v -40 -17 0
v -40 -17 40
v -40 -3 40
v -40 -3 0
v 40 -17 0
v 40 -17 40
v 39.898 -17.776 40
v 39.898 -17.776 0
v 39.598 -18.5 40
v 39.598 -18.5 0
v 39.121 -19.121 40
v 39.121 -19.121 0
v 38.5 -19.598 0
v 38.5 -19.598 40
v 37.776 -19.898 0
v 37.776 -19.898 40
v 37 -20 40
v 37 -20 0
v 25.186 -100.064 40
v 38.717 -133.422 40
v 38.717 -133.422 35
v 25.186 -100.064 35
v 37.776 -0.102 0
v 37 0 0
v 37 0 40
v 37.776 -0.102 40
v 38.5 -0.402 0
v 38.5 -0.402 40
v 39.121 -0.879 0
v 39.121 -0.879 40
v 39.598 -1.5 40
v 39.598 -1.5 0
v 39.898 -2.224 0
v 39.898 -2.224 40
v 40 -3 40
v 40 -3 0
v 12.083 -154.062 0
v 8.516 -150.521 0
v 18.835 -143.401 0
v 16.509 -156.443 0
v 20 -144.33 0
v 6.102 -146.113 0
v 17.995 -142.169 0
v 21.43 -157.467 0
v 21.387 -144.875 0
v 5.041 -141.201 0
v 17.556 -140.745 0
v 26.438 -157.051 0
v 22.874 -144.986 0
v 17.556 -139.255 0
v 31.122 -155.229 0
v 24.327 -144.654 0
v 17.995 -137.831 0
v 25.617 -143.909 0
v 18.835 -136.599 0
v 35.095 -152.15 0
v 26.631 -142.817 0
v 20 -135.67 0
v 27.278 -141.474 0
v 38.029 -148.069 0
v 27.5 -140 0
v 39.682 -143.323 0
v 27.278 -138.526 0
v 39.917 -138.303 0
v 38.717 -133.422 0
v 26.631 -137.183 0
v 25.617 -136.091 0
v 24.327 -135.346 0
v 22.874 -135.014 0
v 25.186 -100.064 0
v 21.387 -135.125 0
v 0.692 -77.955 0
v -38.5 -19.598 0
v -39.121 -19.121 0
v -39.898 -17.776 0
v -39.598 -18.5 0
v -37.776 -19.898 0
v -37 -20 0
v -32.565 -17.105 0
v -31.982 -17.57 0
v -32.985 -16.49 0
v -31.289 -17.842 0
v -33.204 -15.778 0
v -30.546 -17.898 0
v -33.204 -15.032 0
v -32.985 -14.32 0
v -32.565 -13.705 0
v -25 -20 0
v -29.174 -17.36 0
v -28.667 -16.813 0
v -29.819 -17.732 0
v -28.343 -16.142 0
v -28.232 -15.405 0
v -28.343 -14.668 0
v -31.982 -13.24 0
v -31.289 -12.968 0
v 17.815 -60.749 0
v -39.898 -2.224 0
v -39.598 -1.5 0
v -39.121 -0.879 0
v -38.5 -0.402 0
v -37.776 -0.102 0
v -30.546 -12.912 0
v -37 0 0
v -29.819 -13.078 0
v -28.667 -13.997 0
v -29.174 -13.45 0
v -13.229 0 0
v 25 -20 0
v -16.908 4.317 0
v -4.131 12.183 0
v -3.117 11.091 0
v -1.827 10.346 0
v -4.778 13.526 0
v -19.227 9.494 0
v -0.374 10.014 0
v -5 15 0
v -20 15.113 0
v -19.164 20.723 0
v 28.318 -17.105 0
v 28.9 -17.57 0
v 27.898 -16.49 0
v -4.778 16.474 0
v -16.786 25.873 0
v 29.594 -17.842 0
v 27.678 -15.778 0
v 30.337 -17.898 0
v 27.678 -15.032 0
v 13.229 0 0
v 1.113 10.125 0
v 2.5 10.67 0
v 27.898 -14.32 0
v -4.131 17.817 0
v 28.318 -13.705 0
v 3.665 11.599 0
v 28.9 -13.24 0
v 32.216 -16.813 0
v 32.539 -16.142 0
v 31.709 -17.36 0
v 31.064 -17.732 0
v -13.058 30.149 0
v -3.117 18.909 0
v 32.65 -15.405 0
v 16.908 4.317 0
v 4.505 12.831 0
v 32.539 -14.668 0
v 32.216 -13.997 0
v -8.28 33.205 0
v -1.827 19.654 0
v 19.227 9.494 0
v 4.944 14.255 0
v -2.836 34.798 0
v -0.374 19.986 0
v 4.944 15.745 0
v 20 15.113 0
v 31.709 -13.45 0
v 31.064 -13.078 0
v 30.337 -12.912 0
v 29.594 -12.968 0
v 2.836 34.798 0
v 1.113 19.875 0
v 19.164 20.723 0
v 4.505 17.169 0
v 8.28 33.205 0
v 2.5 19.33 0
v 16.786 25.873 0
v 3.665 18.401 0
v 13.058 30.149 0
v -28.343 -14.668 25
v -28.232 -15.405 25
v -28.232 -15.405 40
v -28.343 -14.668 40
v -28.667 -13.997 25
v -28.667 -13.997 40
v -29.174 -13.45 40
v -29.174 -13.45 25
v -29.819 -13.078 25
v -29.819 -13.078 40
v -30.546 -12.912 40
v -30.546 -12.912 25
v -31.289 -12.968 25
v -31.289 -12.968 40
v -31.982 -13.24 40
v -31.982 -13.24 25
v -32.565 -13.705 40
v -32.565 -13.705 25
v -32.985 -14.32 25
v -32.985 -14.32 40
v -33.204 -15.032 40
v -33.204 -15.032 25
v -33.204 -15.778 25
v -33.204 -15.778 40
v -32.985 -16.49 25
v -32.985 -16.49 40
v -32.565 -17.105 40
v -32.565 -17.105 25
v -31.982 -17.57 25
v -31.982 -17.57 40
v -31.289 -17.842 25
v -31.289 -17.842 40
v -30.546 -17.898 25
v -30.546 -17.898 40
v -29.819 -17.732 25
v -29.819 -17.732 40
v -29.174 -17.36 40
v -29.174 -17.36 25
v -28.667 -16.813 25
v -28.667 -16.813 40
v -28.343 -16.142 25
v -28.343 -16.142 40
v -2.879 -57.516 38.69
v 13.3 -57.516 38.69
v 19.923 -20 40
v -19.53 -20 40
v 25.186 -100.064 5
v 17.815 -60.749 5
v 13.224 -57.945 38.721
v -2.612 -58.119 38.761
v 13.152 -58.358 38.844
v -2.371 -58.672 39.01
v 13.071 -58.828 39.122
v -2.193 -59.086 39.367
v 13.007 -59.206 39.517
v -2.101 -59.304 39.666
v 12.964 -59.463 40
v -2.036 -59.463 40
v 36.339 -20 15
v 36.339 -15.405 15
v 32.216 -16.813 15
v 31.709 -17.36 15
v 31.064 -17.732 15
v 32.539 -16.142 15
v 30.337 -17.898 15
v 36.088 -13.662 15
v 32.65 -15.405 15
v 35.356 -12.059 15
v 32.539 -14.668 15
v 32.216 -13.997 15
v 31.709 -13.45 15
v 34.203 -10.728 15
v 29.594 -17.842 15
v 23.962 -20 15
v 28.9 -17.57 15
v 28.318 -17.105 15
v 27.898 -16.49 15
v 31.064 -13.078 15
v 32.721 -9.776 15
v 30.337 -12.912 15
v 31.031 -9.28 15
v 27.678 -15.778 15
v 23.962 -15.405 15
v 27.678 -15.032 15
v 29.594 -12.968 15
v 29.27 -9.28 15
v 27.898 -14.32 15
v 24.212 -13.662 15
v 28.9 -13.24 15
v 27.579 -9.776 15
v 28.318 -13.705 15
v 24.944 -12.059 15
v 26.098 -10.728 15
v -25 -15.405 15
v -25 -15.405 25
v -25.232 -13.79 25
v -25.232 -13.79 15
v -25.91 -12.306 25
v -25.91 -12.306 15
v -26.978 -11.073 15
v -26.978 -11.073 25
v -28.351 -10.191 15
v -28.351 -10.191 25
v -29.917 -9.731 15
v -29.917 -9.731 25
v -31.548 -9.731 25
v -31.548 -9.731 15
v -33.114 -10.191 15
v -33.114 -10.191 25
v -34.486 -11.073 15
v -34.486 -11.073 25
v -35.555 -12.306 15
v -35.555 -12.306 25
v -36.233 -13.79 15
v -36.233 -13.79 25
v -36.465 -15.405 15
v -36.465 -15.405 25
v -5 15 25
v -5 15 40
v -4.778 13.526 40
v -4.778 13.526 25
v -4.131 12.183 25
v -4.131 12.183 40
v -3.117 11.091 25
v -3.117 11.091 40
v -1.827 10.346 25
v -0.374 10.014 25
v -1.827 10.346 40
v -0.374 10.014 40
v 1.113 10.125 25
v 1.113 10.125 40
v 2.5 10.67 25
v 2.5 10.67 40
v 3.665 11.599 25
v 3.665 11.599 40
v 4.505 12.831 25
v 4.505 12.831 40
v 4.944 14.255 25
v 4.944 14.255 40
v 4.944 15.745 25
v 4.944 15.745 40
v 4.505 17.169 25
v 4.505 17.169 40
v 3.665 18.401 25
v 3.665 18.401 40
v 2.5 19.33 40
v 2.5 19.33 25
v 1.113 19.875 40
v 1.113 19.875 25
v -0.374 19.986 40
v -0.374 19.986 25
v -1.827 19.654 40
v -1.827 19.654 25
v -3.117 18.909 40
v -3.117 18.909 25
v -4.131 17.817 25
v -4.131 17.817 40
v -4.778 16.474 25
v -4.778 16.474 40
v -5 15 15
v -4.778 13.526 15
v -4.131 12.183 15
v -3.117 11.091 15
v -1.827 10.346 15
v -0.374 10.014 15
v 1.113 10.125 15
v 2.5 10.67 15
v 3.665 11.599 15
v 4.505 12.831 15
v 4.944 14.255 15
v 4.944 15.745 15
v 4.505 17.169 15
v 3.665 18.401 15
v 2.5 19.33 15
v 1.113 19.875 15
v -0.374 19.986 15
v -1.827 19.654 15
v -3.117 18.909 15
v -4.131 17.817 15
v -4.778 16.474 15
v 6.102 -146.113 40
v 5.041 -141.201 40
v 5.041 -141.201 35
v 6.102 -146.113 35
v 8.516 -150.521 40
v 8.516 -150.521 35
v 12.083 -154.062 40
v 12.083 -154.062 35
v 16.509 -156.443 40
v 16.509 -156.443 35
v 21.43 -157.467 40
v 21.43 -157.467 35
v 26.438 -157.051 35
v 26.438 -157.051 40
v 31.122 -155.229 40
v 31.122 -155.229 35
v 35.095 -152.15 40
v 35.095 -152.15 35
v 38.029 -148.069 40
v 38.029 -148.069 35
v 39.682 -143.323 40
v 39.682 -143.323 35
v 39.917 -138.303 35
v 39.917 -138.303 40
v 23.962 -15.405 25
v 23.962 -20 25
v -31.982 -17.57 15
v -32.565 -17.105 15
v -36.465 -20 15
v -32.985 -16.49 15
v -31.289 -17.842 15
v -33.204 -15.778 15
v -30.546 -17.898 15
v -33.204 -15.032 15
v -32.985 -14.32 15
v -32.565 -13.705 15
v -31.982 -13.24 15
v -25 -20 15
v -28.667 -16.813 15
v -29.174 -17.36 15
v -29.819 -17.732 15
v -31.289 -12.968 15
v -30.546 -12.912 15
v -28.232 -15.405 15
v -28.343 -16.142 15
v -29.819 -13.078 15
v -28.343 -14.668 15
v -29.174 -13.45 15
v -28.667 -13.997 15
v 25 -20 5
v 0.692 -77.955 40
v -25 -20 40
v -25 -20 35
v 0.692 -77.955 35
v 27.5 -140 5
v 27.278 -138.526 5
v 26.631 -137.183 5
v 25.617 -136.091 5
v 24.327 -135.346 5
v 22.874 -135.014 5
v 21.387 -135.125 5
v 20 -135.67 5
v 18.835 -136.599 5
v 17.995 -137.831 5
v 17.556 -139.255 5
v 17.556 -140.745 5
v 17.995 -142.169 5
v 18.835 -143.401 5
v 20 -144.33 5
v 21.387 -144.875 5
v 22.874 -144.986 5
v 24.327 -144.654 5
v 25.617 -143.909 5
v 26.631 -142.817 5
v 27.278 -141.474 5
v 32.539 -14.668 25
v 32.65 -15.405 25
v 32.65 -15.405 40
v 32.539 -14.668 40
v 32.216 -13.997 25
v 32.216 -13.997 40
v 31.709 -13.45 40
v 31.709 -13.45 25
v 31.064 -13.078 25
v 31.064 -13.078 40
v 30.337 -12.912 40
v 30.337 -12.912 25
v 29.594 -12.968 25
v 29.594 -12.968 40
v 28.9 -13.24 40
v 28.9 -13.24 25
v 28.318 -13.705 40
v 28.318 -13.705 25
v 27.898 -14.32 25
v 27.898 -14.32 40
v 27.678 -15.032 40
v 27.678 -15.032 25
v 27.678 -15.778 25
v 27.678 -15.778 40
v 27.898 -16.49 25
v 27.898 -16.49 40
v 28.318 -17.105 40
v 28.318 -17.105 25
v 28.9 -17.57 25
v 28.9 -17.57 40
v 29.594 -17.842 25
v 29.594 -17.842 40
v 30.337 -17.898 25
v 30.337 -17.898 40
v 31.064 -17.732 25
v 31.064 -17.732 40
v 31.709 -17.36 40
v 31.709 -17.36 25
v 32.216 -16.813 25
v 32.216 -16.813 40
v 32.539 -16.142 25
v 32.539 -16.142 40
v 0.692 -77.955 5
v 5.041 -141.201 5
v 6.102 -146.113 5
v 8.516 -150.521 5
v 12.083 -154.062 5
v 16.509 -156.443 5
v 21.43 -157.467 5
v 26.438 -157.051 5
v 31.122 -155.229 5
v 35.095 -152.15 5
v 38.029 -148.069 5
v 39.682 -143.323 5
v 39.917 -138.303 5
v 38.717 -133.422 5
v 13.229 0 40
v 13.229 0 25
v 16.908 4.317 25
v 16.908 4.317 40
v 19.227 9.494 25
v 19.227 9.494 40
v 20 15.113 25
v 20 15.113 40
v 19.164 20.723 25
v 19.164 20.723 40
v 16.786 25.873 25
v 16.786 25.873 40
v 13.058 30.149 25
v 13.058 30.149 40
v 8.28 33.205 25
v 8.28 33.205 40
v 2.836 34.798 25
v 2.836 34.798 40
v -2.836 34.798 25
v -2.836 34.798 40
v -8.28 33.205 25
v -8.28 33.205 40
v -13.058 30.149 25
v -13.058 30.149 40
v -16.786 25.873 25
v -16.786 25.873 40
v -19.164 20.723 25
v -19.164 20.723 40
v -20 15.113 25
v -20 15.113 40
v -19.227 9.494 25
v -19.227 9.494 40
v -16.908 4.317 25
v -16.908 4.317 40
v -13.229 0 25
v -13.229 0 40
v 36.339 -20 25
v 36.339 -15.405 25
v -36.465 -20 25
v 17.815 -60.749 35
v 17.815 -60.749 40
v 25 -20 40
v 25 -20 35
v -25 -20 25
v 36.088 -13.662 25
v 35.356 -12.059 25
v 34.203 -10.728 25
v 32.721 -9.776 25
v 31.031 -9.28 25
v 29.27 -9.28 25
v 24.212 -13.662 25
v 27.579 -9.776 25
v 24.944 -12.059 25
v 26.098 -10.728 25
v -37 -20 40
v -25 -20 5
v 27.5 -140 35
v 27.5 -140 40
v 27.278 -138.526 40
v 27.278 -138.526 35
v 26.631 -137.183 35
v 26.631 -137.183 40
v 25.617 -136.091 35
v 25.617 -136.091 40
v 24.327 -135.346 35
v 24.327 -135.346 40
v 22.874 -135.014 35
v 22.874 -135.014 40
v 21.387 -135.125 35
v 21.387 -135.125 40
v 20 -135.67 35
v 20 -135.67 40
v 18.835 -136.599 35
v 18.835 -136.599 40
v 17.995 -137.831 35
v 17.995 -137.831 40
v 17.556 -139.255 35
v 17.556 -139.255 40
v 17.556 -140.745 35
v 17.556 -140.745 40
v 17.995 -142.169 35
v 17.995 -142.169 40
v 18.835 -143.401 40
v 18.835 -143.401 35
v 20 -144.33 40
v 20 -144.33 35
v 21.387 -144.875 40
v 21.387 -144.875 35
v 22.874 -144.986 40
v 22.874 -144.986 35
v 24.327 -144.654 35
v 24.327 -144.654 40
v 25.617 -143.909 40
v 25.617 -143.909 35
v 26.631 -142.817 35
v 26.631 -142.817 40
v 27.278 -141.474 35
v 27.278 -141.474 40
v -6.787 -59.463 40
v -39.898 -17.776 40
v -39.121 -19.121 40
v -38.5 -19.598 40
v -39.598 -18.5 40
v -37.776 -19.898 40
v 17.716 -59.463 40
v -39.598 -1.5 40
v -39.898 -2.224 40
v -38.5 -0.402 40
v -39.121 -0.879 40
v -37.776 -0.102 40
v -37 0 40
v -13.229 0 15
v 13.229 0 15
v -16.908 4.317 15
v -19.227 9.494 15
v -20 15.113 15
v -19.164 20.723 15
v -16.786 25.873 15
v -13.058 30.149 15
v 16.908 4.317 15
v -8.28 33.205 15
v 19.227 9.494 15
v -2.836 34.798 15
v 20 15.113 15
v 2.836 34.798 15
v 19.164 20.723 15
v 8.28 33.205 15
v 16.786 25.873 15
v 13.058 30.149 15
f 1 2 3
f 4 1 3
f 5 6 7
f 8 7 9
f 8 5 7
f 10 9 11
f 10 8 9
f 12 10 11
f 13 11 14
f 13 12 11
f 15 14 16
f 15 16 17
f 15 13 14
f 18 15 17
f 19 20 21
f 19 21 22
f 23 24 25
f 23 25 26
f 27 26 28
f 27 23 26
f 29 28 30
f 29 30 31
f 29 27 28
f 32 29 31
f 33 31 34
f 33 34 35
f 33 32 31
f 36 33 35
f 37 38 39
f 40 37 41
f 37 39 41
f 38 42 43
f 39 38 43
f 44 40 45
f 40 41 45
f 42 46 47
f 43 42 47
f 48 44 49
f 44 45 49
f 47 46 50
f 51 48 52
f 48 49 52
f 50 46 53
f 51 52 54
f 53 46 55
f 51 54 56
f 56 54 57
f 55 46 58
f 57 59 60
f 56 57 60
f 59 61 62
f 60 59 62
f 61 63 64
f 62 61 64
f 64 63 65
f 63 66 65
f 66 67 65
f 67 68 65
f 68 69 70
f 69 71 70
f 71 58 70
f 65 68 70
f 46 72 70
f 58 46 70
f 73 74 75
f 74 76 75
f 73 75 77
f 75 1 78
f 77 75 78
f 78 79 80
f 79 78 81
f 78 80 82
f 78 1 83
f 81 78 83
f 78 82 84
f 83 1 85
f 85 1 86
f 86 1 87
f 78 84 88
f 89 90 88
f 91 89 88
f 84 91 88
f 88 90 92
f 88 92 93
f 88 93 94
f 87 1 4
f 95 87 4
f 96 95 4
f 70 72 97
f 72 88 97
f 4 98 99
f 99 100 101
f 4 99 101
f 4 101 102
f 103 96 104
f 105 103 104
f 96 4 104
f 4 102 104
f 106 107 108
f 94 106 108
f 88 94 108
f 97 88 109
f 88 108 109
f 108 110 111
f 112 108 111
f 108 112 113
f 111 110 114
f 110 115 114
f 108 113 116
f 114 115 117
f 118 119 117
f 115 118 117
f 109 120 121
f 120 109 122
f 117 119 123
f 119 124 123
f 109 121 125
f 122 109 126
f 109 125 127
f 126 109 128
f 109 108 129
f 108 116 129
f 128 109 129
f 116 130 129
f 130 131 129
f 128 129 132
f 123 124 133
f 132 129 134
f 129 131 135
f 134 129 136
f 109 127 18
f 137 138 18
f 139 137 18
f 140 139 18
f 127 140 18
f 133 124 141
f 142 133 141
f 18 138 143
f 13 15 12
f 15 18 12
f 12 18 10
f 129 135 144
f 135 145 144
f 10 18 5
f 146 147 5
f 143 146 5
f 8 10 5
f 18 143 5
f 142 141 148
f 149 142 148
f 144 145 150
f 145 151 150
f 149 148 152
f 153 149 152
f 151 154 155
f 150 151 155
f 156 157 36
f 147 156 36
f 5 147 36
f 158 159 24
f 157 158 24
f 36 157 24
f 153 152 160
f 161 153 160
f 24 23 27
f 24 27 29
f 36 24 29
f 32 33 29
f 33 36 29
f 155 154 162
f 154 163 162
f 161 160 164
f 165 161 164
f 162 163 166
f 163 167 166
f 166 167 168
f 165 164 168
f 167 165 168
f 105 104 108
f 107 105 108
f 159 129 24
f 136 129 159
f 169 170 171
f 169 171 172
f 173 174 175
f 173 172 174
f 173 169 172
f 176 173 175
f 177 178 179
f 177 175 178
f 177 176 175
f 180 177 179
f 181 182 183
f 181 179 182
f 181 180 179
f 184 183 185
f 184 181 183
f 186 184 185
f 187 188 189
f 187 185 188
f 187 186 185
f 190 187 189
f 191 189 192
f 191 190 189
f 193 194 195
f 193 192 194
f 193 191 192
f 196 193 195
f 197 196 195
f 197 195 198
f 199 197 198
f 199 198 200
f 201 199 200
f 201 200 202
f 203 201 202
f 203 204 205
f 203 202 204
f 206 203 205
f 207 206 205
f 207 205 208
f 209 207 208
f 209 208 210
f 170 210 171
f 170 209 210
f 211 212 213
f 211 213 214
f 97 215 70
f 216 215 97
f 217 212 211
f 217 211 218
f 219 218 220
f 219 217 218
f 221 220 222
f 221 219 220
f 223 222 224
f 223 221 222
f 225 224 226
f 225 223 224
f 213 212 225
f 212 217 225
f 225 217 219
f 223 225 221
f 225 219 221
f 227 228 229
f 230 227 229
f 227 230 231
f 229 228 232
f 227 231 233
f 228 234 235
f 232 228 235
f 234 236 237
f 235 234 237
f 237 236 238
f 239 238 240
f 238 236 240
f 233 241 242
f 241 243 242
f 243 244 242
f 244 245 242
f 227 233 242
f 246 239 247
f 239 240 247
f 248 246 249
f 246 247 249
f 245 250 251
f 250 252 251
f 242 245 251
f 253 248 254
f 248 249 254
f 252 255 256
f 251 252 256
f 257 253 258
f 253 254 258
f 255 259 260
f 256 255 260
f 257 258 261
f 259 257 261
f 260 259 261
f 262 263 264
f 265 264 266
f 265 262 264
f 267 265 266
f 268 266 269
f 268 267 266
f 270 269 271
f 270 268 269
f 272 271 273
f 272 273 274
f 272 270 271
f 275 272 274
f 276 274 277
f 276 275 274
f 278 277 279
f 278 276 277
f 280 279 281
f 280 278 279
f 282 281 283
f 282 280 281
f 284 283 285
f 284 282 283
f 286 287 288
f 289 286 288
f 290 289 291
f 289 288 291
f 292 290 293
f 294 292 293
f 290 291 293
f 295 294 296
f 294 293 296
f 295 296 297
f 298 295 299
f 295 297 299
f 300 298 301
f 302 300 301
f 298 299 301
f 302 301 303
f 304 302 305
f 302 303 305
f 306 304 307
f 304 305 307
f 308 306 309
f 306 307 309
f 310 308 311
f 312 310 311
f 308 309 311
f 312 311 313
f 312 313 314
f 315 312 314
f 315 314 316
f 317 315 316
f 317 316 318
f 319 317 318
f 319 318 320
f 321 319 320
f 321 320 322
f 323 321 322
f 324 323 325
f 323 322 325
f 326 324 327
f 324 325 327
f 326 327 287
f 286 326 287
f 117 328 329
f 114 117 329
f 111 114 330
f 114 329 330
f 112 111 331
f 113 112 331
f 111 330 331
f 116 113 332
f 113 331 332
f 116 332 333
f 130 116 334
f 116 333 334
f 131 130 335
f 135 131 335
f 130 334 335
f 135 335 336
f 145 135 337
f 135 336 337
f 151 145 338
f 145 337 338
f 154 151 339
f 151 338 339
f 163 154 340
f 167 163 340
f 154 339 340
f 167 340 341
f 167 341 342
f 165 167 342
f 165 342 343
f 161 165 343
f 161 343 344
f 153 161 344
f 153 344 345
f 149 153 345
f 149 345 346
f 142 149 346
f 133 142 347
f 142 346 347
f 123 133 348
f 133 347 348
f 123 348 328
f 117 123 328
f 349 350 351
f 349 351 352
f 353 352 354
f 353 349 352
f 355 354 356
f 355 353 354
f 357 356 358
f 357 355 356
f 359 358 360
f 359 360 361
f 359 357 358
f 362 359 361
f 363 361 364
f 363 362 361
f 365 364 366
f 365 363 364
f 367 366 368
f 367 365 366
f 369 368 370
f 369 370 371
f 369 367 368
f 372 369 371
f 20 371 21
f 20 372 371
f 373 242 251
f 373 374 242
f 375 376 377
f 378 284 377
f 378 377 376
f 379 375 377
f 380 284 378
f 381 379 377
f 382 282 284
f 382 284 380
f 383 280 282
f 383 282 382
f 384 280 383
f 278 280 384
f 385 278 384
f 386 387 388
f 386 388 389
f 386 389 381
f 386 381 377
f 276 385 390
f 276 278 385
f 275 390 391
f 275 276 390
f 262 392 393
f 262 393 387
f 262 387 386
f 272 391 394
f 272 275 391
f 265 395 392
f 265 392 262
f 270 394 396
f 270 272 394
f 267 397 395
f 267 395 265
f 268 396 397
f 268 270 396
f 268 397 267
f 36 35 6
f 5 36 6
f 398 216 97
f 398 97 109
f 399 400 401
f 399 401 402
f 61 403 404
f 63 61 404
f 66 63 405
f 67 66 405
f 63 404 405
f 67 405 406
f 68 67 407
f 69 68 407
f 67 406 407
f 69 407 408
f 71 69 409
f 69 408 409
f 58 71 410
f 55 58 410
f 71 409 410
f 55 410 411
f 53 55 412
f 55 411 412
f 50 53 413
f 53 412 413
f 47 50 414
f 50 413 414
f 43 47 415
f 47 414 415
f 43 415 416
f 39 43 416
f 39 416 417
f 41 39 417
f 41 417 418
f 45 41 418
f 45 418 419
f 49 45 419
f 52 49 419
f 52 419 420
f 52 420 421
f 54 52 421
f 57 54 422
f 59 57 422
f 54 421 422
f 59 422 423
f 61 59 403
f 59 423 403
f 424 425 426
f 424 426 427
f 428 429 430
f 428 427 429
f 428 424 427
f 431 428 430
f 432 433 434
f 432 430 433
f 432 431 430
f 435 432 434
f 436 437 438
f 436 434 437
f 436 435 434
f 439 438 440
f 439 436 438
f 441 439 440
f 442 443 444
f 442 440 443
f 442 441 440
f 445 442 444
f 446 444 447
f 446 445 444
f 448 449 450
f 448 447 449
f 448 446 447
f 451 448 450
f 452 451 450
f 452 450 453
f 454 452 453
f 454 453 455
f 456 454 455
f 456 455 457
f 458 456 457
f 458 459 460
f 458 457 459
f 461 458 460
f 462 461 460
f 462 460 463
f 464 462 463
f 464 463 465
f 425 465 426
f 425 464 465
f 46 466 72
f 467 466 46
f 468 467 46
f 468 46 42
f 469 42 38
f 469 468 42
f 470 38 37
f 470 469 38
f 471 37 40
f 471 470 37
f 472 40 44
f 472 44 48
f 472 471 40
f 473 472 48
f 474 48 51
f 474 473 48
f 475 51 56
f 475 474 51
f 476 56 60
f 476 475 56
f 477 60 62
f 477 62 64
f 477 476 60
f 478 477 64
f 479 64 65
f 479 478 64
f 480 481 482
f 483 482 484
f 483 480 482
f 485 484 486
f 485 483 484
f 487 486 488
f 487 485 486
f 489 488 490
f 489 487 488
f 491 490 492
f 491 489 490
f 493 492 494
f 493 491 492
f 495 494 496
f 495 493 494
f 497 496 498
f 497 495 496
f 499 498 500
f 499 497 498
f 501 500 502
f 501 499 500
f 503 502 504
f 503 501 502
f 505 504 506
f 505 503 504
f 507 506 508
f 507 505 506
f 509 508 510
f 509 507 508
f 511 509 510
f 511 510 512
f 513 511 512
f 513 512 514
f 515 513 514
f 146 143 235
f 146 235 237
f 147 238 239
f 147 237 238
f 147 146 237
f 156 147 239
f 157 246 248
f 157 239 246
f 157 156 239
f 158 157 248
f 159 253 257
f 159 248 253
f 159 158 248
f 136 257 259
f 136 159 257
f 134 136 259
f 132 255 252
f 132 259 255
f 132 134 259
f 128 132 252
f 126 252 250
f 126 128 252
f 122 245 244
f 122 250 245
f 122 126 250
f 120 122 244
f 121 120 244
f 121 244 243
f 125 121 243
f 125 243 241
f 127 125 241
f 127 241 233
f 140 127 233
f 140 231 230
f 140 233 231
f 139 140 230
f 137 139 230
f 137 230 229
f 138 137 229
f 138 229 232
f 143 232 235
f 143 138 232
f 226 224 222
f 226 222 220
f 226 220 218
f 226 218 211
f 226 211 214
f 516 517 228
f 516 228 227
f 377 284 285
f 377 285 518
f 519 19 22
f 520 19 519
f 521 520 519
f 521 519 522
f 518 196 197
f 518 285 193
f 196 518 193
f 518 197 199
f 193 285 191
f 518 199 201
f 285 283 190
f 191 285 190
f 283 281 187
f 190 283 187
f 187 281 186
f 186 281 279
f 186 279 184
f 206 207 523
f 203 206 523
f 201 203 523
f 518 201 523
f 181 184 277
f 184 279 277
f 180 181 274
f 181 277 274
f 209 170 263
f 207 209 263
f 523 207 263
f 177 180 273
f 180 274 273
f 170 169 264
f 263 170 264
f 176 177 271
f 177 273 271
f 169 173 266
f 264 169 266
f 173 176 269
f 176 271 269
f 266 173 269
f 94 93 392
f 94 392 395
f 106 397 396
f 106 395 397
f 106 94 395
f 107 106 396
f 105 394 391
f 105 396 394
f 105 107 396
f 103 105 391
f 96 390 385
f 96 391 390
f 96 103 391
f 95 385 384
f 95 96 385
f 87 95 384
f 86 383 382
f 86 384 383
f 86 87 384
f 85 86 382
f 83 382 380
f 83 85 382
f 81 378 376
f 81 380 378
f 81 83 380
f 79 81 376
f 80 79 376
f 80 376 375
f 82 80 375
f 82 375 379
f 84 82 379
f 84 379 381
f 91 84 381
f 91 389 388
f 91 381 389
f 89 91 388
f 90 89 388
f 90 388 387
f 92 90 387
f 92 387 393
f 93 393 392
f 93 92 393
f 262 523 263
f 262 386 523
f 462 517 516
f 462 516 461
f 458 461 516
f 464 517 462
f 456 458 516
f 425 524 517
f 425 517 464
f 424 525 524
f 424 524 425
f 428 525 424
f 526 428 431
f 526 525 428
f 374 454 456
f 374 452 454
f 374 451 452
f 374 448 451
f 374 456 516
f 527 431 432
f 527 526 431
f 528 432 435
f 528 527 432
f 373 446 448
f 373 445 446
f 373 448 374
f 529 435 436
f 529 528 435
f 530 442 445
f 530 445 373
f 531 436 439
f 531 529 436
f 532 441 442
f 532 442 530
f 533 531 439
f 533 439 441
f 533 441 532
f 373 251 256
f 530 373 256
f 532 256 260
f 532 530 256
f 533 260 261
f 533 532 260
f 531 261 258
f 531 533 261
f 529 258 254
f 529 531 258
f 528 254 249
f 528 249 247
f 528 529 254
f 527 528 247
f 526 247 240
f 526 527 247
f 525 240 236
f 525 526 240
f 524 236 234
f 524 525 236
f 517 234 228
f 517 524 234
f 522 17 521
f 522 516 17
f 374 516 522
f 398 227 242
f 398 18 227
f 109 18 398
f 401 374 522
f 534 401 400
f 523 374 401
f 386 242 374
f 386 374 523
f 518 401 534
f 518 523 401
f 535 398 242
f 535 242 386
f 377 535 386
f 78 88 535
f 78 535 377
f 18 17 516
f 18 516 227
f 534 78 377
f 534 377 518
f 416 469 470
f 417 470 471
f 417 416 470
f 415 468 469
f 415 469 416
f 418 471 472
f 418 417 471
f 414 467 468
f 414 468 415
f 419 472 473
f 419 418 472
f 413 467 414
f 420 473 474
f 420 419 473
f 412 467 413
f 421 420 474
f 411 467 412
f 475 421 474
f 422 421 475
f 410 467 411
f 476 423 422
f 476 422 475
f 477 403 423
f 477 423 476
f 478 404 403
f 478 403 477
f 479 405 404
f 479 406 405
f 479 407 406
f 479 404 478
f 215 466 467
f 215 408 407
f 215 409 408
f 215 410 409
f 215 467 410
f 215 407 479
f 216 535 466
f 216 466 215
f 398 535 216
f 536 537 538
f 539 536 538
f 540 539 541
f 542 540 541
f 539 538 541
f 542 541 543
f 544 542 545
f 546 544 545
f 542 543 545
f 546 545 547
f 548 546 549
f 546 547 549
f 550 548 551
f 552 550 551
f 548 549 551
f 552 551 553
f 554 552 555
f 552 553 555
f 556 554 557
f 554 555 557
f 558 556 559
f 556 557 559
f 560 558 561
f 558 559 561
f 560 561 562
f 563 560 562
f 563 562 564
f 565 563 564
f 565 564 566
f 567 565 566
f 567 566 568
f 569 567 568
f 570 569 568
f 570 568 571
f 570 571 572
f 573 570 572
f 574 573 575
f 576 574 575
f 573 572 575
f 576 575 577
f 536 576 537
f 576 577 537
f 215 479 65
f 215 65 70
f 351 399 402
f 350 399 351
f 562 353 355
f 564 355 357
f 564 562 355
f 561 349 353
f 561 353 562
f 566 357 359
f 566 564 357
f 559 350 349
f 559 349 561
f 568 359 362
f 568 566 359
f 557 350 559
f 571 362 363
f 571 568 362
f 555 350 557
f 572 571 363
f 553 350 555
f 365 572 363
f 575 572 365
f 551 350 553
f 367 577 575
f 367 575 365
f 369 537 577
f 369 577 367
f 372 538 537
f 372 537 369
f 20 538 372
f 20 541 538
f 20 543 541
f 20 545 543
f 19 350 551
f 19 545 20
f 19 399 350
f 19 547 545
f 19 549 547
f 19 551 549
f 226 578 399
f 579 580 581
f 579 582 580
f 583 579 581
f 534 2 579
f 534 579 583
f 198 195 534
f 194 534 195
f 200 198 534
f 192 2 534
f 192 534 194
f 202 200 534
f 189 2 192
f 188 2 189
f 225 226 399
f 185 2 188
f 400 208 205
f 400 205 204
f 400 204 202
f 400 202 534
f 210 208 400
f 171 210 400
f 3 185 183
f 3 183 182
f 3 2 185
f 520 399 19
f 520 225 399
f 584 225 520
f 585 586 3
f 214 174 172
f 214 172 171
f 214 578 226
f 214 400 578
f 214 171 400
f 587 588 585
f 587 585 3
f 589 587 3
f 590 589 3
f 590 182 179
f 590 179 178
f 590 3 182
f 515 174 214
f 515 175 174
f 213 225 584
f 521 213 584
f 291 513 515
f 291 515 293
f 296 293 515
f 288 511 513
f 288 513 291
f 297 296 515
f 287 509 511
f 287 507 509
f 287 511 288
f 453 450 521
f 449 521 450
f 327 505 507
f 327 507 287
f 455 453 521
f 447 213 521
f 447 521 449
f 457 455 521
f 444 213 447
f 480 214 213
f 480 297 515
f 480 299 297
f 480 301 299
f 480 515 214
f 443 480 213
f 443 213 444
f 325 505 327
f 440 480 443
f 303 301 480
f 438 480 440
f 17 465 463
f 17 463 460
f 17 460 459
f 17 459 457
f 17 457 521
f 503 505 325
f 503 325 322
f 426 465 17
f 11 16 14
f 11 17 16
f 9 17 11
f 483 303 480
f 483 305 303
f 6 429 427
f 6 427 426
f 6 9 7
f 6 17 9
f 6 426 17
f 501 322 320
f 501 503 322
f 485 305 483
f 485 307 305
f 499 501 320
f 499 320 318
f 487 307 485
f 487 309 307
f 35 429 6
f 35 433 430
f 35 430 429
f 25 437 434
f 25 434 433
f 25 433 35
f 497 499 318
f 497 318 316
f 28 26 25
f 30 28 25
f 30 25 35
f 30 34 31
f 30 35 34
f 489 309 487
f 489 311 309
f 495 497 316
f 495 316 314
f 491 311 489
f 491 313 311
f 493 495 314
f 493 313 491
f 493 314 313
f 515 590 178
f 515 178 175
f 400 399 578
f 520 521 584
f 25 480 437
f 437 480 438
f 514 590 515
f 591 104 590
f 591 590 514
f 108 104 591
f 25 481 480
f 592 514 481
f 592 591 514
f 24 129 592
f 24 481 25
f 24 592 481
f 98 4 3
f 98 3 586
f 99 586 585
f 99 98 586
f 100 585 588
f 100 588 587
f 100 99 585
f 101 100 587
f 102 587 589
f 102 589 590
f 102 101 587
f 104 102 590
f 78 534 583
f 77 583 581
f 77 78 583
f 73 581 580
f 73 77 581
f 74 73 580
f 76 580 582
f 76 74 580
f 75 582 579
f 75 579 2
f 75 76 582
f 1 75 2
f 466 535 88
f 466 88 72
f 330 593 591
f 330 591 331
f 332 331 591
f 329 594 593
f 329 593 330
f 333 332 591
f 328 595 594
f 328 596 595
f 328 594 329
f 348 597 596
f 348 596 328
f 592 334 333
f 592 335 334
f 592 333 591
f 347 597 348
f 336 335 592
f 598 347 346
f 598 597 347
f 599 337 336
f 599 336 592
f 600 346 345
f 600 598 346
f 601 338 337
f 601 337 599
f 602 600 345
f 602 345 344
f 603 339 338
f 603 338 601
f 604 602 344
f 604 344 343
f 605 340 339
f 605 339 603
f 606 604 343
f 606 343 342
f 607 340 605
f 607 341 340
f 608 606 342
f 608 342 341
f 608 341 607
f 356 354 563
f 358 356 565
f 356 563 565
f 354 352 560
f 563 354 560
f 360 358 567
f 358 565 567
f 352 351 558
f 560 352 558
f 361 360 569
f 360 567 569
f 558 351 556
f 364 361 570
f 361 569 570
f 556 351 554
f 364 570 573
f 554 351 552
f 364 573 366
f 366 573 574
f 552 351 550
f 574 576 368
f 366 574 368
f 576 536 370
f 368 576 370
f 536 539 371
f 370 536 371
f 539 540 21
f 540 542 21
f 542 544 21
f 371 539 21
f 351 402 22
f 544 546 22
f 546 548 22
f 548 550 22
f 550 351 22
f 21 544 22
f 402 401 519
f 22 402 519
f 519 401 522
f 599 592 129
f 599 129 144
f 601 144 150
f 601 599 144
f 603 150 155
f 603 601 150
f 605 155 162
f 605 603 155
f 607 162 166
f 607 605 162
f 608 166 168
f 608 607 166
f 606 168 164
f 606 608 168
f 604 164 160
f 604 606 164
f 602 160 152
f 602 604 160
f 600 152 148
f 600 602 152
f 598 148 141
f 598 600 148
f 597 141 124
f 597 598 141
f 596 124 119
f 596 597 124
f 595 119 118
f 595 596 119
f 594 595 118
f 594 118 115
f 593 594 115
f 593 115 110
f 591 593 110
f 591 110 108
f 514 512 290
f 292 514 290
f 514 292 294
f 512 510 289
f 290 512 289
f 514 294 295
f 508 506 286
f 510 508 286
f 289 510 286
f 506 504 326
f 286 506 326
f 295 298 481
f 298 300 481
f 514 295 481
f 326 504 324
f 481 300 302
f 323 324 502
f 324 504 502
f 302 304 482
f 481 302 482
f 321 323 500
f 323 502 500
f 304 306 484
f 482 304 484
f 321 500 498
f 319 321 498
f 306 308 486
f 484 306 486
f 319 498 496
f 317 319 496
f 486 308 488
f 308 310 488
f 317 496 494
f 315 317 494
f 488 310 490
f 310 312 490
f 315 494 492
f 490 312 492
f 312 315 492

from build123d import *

# Parameters (mm, degrees)
SALIENTE_EXTRUIR1_DEPTH    = 40
CROQUIS2_R                 = 5
SALIENTE_EXTRUIR2_DEPTH    = 5
SALIENTE_EXTRUIR3_START    = -35
CROQUIS2_4_R               = 5
SALIENTE_EXTRUIR3_DEPTH    = 5
CORTAR_EXTRUIR1_DEPTH      = 167.172965861
REDONDEO5_R                = 2
CORTAR_EXTRUIR2_DEPTH      = 5
CORTAR_EXTRUIR3_DEPTH      = 164.7261433
CORTAR_EXTRUIR3_DEPTH_BACK = 164.7261433
CROQUIS4_4_R               = 2.5
SALIENTE_EXTRUIR5_START    = 20
CROQUIS7_R                 = 20
CROQUIS7_R_2               = 5
SALIENTE_EXTRUIR5_DEPTH    = 15
SALIENTE_EXTRUIR6_START    = -5
CROQUIS7_2_R               = 20
CROQUIS7_2_R_2             = 5
SALIENTE_EXTRUIR6_DEPTH    = 15


with BuildPart() as part:
    # Croquis1 → Saliente-Extruir1 (new body)
    with BuildSketch(Plane.XY):
        with BuildLine():
            Line((-37, 0), (37, 0))
            ThreePointArc((37, 0), (39.121320344, -0.878679656), (40, -3))
            Line((40, -3), (40, -17))
            ThreePointArc((40, -17), (39.121320344, -19.121320344), (37, -20))
            Line((37, -20), (-37, -20))
            ThreePointArc((-37, -20), (-39.121320344, -19.121320344), (-40, -17))
            Line((-40, -17), (-40, -3))
            ThreePointArc((-40, -3), (-39.121320344, -0.878679656), (-37, 0))
        make_face()
    extrude(amount=SALIENTE_EXTRUIR1_DEPTH)

    # Croquis2 → Saliente-Extruir2 (add)
    with BuildSketch(Plane.XY.offset(40)):
        with BuildLine():
            Line((-25, -20), (0.692322562, -77.955122319))
            Line((0.692322562, -77.955122319), (5.041226188, -141.200506964))
            ThreePointArc((5.041226188, -141.200506964), (26.438391415, -157.05107249), (38.716761316, -133.422260844))
            Line((38.716761316, -133.422260844), (25.186319846, -100.064303858))
            Line((25.186319846, -100.064303858), (17.814778444, -60.749416381))
            Line((17.814778444, -60.749416381), (25, -20))
            Line((25, -20), (0, -20))
            Line((0, -20), (-25, -20))
        make_face()
        with Locations((22.5, -140)):
            Circle(CROQUIS2_R, mode=Mode.SUBTRACT)
    extrude(amount=-SALIENTE_EXTRUIR2_DEPTH)

    # Croquis2<4> → Saliente-Extruir3 (add)
    with BuildSketch(Plane.XY.offset(40).offset(SALIENTE_EXTRUIR3_START)):
        with BuildLine():
            Line((-25, -20), (0.692322562, -77.955122319))
            Line((0.692322562, -77.955122319), (5.041226188, -141.200506964))
            ThreePointArc((5.041226188, -141.200506964), (26.438391415, -157.05107249), (38.716761316, -133.422260844))
            Line((38.716761316, -133.422260844), (25.186319846, -100.064303858))
            Line((25.186319846, -100.064303858), (17.814778444, -60.749416381))
            Line((17.814778444, -60.749416381), (25, -20))
            Line((25, -20), (0, -20))
            Line((0, -20), (-25, -20))
        make_face()
        with Locations((22.5, -140)):
            Circle(CROQUIS2_4_R, mode=Mode.SUBTRACT)
    extrude(amount=-SALIENTE_EXTRUIR3_DEPTH)

    # Croquis3 → Cortar-Extruir1 (cut, through all)
    with BuildSketch(Plane(origin=(0, -1.419488972, 40.648845743), x_dir=(1, 0, 0), z_dir=(0, -0.034899496702501046, 0.9993908270190958))):
        Polygon((-19.530157581, -18.591836672), (19.922773595, -18.591836672), (12.964371873, -58.030854026), (-2.035628127, -58.030854026), align=None)
    extrude(amount=CORTAR_EXTRUIR1_DEPTH, mode=Mode.SUBTRACT)

    # Redondeo5
    # the kernel refuses this fillet: 2 mm, written as the material it adds along each edge
    with BuildSketch(Plane(origin=(17.715799962, -59.41499217, 38.623598144), x_dir=(0, 0.9993908270190957, 0.03489949670250261), z_dir=(-1, 0, 0))) as redondeo5_piece_1:
        with BuildLine():
            CenterArc((1.900571235, -2), REDONDEO5_R, 90, 71.857609754)
            Line((0, -1.377240834), (-0.038011425, -1.364785651))
            ThreePointArc((-0.038011425, -1.364785651), (-0.04, -0.688620417), (-0.04, 0))
            Line((-0.04, 0), (0, 0.04))
            Line((0, 0.04), (1.900571235, 0.04))
            Line((1.900571235, 0.04), (1.900571235, 0))
        make_face()
    extrude(amount=24.502856177)

    # Croquis4 → Cortar-Extruir2 (cut, symmetric)
    with BuildSketch(Plane.XY.offset(20)):
        with BuildLine():
            Line((-36.464835441, -15.405002376), (-36.464835441, -20))
            Line((-36.464835441, -20), (-25, -20))
            Line((-25, -20), (-25, -15.405002376))
            ThreePointArc((-25, -15.405002376), (-30.732417721, -9.672584656), (-36.464835441, -15.405002376))
        make_face()
        with BuildLine():
            Line((36.338744123, -15.405012958), (36.338744123, -20))
            Line((36.338744123, -20), (23.961776552, -20))
            Line((23.961776552, -20), (23.961776552, -15.405012958))
            ThreePointArc((23.961776552, -15.405012958), (30.150260338, -9.216529173), (36.338744123, -15.405012958))
        make_face()
    extrude(amount=CORTAR_EXTRUIR2_DEPTH, both=True, mode=Mode.SUBTRACT)

    # Croquis4<4> → Cortar-Extruir3 (cut, two sides: drawn at the far end of the back side and taken through both)
    with BuildSketch(Plane.XY.offset(20).offset(-CORTAR_EXTRUIR3_DEPTH_BACK)):
        with Locations((-30.732417721, -15.405002376)):
            Circle(CROQUIS4_4_R)
        with Locations((30.150260338, -15.405012958)):
            Circle(CROQUIS4_4_R)
    extrude(amount=CORTAR_EXTRUIR3_DEPTH + CORTAR_EXTRUIR3_DEPTH_BACK, mode=Mode.SUBTRACT)

    # Croquis7 → Saliente-Extruir5 (add)
    with BuildSketch(Plane.XY.offset(20).offset(SALIENTE_EXTRUIR5_START)):
        with Locations((0, 15)):
            Circle(CROQUIS7_R)
        with Locations(Location((0, 15, 0), (0, 0, 180))):
            Circle(CROQUIS7_R_2, mode=Mode.SUBTRACT)
    extrude(amount=-SALIENTE_EXTRUIR5_DEPTH)

    # Croquis7<2> → Saliente-Extruir6 (add)
    with BuildSketch(Plane.XY.offset(20).offset(SALIENTE_EXTRUIR6_START)):
        with Locations((0, 15)):
            Circle(CROQUIS7_2_R)
        with Locations(Location((0, 15, 0), (0, 0, 180))):
            Circle(CROQUIS7_2_R_2, mode=Mode.SUBTRACT)
    extrude(amount=-SALIENTE_EXTRUIR6_DEPTH)


solid = part.part
